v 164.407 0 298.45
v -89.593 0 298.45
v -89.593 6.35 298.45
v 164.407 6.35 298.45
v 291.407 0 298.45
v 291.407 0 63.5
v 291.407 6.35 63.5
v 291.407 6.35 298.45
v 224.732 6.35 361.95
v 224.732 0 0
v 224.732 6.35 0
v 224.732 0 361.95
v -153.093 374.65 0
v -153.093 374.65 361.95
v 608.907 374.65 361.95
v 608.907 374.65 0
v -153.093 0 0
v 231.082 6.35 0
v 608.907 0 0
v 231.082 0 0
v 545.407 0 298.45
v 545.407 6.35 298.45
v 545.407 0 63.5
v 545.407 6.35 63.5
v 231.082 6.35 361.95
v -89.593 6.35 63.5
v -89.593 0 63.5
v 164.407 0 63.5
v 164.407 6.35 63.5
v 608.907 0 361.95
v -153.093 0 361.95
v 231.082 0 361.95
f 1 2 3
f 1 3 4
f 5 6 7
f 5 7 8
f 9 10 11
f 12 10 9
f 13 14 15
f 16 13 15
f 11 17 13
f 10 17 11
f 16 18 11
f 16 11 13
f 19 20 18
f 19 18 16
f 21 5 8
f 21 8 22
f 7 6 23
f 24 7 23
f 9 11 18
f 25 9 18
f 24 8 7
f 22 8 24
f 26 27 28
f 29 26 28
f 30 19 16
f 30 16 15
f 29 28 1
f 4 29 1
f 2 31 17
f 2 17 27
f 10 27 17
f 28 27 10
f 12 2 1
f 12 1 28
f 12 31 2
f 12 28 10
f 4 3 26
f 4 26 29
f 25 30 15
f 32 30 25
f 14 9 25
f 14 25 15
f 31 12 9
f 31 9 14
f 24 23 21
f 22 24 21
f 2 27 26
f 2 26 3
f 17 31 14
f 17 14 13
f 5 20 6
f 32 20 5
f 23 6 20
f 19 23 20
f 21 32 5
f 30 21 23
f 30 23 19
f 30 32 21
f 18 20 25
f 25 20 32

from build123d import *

# Parameters (mm, degrees)
F0_W     = 254
F0_H     = 234.95
F0_W_2   = 3.175
F0_H_2   = 361.95
F1_DEPTH = 374.65
F2_DEPTH = 6.35


# Not quite as in the source:
# - a feature names something its author has since deleted; it is built from what else it names


with BuildPart() as f1:
    # F0 (on Front) → F1 (new body)
    with BuildSketch(Plane.XZ):
        Polygon((-153.0927574873, 0), (224.7322425127, 0), (224.7322425127, 361.95), (177.1072425127, 361.95), (-153.0927574873, 361.95), align=None)
        with Locations((37.4072425127, 180.975)):
            Rectangle(F0_W, F0_H, mode=Mode.SUBTRACT)
        Polygon((231.0822425127, 361.95), (231.0822425127, 0), (608.9072425127, 0), (608.9072425127, 361.95), (278.7072425127, 361.95), align=None)
        with Locations((418.4072425127, 180.975)):
            Rectangle(F0_W, F0_H, mode=Mode.SUBTRACT)
        with Locations((37.4072425127, 180.975)):
            Rectangle(F0_W, F0_H)
        with Locations((418.4072425127, 180.975)):
            Rectangle(F0_W, F0_H)
        with Locations((226.3197425127, 180.975)):
            Rectangle(F0_W_2, F0_H_2)
        with Locations((229.4947425127, 180.975)):
            Rectangle(F0_W_2, F0_H_2)
    extrude(amount=-F1_DEPTH)

    # F0 (on Front) → F2 (cut)
    with BuildSketch(Plane.XZ):
        with Locations((226.3197425127, 180.975)):
            Rectangle(F0_W_2, F0_H_2)
        with Locations((229.4947425127, 180.975)):
            Rectangle(F0_W_2, F0_H_2)
        with Locations((37.4072425127, 180.975)):
            Rectangle(F0_W, F0_H)
        with Locations((418.4072425127, 180.975)):
            Rectangle(F0_W, F0_H)
    extrude(amount=-F2_DEPTH, mode=Mode.SUBTRACT)


solid = f1.part
